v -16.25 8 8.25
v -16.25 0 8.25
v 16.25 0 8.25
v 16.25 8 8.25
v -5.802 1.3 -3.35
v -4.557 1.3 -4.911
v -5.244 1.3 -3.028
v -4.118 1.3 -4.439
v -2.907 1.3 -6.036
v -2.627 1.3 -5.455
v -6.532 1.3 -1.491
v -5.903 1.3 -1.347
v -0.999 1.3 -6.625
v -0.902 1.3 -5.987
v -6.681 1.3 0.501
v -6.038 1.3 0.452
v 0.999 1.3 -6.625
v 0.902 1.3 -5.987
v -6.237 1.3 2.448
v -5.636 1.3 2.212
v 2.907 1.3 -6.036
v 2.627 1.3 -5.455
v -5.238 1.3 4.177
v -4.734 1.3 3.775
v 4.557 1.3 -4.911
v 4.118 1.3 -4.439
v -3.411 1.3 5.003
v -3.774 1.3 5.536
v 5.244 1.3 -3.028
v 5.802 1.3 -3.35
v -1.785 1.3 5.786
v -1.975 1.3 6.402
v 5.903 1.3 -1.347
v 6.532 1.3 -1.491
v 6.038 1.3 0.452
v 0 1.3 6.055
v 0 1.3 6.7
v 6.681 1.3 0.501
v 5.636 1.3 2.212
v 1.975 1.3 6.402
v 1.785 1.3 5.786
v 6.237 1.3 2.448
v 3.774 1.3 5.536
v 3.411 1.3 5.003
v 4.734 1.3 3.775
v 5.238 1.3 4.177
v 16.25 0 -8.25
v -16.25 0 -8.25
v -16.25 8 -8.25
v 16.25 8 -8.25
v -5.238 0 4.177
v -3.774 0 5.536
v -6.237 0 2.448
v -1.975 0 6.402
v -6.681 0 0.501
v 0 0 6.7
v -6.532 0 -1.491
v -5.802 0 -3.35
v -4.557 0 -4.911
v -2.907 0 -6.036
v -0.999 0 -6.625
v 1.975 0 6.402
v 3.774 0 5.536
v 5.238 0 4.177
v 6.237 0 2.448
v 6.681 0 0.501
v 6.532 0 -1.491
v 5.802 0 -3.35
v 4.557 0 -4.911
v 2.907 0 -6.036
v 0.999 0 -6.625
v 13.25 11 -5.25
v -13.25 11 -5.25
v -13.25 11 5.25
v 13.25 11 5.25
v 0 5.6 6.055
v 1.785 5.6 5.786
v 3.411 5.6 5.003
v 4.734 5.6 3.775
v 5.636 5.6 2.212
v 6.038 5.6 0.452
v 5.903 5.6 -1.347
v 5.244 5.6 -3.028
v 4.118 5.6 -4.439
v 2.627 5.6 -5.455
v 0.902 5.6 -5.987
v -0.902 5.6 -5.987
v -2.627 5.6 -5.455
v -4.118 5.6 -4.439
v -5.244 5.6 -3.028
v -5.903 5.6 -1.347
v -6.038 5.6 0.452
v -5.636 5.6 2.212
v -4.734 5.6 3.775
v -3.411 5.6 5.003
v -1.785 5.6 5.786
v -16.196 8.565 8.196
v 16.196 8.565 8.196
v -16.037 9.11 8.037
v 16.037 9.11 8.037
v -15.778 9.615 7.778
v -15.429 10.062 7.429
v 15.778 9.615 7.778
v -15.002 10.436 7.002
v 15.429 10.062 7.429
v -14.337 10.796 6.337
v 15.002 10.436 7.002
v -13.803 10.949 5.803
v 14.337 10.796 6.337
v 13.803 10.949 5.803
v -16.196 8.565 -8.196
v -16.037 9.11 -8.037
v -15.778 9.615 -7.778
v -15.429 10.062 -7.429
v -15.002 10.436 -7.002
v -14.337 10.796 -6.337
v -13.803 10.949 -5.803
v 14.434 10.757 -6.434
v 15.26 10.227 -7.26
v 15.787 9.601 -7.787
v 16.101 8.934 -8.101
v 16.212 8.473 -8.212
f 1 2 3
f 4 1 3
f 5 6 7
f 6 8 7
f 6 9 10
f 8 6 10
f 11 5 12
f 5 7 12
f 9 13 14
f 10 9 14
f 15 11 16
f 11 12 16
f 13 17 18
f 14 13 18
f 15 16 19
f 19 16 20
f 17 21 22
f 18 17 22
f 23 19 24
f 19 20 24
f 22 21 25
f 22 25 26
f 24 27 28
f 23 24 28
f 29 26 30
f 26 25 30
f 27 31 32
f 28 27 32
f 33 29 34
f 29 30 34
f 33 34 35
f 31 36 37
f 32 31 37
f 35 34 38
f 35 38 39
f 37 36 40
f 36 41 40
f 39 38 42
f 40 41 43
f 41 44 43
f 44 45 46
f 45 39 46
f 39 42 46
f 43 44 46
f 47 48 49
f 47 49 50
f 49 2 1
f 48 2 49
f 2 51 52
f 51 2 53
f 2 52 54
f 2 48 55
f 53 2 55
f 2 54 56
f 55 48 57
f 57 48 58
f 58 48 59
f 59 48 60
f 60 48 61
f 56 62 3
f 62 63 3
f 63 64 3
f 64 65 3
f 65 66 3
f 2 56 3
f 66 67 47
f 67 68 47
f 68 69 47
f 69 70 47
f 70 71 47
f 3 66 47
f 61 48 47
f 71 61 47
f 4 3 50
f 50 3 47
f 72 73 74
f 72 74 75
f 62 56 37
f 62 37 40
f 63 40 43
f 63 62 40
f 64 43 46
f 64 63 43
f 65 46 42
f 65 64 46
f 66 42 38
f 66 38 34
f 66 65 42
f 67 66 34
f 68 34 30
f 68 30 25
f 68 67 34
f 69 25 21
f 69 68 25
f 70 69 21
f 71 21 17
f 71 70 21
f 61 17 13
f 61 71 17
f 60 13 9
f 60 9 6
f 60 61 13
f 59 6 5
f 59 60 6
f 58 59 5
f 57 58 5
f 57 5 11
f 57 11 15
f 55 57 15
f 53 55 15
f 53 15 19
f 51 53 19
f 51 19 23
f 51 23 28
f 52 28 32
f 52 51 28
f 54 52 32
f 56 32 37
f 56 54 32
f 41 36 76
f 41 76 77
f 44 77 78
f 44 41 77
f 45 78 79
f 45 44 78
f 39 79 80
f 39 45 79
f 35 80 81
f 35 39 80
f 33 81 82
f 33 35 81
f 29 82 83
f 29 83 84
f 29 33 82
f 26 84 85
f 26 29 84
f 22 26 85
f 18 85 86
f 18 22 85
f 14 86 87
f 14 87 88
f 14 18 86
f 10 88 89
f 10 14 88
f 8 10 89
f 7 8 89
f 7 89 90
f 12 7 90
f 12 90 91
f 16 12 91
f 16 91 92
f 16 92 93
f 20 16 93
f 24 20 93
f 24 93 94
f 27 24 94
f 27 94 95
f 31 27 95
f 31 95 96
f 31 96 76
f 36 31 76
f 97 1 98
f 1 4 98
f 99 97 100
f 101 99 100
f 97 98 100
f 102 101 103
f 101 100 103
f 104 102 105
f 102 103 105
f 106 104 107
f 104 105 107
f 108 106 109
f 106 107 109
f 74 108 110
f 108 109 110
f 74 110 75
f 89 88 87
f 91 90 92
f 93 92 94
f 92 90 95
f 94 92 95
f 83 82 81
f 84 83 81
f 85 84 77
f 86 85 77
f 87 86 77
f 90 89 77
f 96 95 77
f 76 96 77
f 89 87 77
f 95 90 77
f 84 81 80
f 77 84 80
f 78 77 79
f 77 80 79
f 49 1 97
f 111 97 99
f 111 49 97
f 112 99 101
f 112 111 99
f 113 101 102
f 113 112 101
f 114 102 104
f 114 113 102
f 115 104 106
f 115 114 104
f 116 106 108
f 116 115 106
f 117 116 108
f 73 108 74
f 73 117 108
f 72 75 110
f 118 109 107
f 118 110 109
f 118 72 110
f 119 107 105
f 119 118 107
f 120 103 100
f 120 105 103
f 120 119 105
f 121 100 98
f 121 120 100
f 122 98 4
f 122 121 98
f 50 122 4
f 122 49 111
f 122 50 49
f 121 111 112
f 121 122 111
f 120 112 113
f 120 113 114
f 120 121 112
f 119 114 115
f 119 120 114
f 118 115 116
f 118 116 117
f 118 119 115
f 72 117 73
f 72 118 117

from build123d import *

# Parameters (mm, degrees)
SKETCH1_R           = 6.7
SKETCH1_R_2         = 6.055
BOSS_EXTRUDE1_DEPTH = 1.3
SKETCH1_2_R         = 6.055
BOSS_EXTRUDE2_DEPTH = 5.6
SKETCH2_W           = 32.5
SKETCH2_H           = 16.5
BOSS_EXTRUDE3_DEPTH = 11
FILLET1_R           = 3


with BuildPart() as part:
    # Sketch1 → Boss-Extrude1 (new body)
    with BuildSketch(Plane(origin=(0, 0, 0), x_dir=(1, 0, 0), z_dir=(0, 1, 0))):
        Circle(SKETCH1_R)
        Circle(SKETCH1_R_2, mode=Mode.SUBTRACT)
    extrude(amount=BOSS_EXTRUDE1_DEPTH)

    # Sketch1<2> → Boss-Extrude2 (add)
    with BuildSketch(Plane(origin=(0, 0, 0), x_dir=(1, 0, 0), z_dir=(0, 1, 0))):
        Circle(SKETCH1_2_R)
    extrude(amount=BOSS_EXTRUDE2_DEPTH)


with BuildPart() as body_2:
    # Sketch2 → Boss-Extrude3 (new body)
    with BuildSketch(Plane(origin=(0, 0, 0), x_dir=(1, 0, 0), z_dir=(0, 1, 0))):
        Rectangle(SKETCH2_W, SKETCH2_H)
    extrude(amount=BOSS_EXTRUDE3_DEPTH)

    # Combine1: cut part
    add(part.part, mode=Mode.SUBTRACT)

    # Fillet1
    fillet1_edges = [body_2.edges().sort_by_distance(p)[0] for p in [
        (0, 11, 8.25),
        (-16.25, 11, 0),
        (0, 11, -8.25),
        (16.25, 11, 0),
    ]]
    fillet(fillet1_edges, radius=FILLET1_R)


solid = body_2.part
